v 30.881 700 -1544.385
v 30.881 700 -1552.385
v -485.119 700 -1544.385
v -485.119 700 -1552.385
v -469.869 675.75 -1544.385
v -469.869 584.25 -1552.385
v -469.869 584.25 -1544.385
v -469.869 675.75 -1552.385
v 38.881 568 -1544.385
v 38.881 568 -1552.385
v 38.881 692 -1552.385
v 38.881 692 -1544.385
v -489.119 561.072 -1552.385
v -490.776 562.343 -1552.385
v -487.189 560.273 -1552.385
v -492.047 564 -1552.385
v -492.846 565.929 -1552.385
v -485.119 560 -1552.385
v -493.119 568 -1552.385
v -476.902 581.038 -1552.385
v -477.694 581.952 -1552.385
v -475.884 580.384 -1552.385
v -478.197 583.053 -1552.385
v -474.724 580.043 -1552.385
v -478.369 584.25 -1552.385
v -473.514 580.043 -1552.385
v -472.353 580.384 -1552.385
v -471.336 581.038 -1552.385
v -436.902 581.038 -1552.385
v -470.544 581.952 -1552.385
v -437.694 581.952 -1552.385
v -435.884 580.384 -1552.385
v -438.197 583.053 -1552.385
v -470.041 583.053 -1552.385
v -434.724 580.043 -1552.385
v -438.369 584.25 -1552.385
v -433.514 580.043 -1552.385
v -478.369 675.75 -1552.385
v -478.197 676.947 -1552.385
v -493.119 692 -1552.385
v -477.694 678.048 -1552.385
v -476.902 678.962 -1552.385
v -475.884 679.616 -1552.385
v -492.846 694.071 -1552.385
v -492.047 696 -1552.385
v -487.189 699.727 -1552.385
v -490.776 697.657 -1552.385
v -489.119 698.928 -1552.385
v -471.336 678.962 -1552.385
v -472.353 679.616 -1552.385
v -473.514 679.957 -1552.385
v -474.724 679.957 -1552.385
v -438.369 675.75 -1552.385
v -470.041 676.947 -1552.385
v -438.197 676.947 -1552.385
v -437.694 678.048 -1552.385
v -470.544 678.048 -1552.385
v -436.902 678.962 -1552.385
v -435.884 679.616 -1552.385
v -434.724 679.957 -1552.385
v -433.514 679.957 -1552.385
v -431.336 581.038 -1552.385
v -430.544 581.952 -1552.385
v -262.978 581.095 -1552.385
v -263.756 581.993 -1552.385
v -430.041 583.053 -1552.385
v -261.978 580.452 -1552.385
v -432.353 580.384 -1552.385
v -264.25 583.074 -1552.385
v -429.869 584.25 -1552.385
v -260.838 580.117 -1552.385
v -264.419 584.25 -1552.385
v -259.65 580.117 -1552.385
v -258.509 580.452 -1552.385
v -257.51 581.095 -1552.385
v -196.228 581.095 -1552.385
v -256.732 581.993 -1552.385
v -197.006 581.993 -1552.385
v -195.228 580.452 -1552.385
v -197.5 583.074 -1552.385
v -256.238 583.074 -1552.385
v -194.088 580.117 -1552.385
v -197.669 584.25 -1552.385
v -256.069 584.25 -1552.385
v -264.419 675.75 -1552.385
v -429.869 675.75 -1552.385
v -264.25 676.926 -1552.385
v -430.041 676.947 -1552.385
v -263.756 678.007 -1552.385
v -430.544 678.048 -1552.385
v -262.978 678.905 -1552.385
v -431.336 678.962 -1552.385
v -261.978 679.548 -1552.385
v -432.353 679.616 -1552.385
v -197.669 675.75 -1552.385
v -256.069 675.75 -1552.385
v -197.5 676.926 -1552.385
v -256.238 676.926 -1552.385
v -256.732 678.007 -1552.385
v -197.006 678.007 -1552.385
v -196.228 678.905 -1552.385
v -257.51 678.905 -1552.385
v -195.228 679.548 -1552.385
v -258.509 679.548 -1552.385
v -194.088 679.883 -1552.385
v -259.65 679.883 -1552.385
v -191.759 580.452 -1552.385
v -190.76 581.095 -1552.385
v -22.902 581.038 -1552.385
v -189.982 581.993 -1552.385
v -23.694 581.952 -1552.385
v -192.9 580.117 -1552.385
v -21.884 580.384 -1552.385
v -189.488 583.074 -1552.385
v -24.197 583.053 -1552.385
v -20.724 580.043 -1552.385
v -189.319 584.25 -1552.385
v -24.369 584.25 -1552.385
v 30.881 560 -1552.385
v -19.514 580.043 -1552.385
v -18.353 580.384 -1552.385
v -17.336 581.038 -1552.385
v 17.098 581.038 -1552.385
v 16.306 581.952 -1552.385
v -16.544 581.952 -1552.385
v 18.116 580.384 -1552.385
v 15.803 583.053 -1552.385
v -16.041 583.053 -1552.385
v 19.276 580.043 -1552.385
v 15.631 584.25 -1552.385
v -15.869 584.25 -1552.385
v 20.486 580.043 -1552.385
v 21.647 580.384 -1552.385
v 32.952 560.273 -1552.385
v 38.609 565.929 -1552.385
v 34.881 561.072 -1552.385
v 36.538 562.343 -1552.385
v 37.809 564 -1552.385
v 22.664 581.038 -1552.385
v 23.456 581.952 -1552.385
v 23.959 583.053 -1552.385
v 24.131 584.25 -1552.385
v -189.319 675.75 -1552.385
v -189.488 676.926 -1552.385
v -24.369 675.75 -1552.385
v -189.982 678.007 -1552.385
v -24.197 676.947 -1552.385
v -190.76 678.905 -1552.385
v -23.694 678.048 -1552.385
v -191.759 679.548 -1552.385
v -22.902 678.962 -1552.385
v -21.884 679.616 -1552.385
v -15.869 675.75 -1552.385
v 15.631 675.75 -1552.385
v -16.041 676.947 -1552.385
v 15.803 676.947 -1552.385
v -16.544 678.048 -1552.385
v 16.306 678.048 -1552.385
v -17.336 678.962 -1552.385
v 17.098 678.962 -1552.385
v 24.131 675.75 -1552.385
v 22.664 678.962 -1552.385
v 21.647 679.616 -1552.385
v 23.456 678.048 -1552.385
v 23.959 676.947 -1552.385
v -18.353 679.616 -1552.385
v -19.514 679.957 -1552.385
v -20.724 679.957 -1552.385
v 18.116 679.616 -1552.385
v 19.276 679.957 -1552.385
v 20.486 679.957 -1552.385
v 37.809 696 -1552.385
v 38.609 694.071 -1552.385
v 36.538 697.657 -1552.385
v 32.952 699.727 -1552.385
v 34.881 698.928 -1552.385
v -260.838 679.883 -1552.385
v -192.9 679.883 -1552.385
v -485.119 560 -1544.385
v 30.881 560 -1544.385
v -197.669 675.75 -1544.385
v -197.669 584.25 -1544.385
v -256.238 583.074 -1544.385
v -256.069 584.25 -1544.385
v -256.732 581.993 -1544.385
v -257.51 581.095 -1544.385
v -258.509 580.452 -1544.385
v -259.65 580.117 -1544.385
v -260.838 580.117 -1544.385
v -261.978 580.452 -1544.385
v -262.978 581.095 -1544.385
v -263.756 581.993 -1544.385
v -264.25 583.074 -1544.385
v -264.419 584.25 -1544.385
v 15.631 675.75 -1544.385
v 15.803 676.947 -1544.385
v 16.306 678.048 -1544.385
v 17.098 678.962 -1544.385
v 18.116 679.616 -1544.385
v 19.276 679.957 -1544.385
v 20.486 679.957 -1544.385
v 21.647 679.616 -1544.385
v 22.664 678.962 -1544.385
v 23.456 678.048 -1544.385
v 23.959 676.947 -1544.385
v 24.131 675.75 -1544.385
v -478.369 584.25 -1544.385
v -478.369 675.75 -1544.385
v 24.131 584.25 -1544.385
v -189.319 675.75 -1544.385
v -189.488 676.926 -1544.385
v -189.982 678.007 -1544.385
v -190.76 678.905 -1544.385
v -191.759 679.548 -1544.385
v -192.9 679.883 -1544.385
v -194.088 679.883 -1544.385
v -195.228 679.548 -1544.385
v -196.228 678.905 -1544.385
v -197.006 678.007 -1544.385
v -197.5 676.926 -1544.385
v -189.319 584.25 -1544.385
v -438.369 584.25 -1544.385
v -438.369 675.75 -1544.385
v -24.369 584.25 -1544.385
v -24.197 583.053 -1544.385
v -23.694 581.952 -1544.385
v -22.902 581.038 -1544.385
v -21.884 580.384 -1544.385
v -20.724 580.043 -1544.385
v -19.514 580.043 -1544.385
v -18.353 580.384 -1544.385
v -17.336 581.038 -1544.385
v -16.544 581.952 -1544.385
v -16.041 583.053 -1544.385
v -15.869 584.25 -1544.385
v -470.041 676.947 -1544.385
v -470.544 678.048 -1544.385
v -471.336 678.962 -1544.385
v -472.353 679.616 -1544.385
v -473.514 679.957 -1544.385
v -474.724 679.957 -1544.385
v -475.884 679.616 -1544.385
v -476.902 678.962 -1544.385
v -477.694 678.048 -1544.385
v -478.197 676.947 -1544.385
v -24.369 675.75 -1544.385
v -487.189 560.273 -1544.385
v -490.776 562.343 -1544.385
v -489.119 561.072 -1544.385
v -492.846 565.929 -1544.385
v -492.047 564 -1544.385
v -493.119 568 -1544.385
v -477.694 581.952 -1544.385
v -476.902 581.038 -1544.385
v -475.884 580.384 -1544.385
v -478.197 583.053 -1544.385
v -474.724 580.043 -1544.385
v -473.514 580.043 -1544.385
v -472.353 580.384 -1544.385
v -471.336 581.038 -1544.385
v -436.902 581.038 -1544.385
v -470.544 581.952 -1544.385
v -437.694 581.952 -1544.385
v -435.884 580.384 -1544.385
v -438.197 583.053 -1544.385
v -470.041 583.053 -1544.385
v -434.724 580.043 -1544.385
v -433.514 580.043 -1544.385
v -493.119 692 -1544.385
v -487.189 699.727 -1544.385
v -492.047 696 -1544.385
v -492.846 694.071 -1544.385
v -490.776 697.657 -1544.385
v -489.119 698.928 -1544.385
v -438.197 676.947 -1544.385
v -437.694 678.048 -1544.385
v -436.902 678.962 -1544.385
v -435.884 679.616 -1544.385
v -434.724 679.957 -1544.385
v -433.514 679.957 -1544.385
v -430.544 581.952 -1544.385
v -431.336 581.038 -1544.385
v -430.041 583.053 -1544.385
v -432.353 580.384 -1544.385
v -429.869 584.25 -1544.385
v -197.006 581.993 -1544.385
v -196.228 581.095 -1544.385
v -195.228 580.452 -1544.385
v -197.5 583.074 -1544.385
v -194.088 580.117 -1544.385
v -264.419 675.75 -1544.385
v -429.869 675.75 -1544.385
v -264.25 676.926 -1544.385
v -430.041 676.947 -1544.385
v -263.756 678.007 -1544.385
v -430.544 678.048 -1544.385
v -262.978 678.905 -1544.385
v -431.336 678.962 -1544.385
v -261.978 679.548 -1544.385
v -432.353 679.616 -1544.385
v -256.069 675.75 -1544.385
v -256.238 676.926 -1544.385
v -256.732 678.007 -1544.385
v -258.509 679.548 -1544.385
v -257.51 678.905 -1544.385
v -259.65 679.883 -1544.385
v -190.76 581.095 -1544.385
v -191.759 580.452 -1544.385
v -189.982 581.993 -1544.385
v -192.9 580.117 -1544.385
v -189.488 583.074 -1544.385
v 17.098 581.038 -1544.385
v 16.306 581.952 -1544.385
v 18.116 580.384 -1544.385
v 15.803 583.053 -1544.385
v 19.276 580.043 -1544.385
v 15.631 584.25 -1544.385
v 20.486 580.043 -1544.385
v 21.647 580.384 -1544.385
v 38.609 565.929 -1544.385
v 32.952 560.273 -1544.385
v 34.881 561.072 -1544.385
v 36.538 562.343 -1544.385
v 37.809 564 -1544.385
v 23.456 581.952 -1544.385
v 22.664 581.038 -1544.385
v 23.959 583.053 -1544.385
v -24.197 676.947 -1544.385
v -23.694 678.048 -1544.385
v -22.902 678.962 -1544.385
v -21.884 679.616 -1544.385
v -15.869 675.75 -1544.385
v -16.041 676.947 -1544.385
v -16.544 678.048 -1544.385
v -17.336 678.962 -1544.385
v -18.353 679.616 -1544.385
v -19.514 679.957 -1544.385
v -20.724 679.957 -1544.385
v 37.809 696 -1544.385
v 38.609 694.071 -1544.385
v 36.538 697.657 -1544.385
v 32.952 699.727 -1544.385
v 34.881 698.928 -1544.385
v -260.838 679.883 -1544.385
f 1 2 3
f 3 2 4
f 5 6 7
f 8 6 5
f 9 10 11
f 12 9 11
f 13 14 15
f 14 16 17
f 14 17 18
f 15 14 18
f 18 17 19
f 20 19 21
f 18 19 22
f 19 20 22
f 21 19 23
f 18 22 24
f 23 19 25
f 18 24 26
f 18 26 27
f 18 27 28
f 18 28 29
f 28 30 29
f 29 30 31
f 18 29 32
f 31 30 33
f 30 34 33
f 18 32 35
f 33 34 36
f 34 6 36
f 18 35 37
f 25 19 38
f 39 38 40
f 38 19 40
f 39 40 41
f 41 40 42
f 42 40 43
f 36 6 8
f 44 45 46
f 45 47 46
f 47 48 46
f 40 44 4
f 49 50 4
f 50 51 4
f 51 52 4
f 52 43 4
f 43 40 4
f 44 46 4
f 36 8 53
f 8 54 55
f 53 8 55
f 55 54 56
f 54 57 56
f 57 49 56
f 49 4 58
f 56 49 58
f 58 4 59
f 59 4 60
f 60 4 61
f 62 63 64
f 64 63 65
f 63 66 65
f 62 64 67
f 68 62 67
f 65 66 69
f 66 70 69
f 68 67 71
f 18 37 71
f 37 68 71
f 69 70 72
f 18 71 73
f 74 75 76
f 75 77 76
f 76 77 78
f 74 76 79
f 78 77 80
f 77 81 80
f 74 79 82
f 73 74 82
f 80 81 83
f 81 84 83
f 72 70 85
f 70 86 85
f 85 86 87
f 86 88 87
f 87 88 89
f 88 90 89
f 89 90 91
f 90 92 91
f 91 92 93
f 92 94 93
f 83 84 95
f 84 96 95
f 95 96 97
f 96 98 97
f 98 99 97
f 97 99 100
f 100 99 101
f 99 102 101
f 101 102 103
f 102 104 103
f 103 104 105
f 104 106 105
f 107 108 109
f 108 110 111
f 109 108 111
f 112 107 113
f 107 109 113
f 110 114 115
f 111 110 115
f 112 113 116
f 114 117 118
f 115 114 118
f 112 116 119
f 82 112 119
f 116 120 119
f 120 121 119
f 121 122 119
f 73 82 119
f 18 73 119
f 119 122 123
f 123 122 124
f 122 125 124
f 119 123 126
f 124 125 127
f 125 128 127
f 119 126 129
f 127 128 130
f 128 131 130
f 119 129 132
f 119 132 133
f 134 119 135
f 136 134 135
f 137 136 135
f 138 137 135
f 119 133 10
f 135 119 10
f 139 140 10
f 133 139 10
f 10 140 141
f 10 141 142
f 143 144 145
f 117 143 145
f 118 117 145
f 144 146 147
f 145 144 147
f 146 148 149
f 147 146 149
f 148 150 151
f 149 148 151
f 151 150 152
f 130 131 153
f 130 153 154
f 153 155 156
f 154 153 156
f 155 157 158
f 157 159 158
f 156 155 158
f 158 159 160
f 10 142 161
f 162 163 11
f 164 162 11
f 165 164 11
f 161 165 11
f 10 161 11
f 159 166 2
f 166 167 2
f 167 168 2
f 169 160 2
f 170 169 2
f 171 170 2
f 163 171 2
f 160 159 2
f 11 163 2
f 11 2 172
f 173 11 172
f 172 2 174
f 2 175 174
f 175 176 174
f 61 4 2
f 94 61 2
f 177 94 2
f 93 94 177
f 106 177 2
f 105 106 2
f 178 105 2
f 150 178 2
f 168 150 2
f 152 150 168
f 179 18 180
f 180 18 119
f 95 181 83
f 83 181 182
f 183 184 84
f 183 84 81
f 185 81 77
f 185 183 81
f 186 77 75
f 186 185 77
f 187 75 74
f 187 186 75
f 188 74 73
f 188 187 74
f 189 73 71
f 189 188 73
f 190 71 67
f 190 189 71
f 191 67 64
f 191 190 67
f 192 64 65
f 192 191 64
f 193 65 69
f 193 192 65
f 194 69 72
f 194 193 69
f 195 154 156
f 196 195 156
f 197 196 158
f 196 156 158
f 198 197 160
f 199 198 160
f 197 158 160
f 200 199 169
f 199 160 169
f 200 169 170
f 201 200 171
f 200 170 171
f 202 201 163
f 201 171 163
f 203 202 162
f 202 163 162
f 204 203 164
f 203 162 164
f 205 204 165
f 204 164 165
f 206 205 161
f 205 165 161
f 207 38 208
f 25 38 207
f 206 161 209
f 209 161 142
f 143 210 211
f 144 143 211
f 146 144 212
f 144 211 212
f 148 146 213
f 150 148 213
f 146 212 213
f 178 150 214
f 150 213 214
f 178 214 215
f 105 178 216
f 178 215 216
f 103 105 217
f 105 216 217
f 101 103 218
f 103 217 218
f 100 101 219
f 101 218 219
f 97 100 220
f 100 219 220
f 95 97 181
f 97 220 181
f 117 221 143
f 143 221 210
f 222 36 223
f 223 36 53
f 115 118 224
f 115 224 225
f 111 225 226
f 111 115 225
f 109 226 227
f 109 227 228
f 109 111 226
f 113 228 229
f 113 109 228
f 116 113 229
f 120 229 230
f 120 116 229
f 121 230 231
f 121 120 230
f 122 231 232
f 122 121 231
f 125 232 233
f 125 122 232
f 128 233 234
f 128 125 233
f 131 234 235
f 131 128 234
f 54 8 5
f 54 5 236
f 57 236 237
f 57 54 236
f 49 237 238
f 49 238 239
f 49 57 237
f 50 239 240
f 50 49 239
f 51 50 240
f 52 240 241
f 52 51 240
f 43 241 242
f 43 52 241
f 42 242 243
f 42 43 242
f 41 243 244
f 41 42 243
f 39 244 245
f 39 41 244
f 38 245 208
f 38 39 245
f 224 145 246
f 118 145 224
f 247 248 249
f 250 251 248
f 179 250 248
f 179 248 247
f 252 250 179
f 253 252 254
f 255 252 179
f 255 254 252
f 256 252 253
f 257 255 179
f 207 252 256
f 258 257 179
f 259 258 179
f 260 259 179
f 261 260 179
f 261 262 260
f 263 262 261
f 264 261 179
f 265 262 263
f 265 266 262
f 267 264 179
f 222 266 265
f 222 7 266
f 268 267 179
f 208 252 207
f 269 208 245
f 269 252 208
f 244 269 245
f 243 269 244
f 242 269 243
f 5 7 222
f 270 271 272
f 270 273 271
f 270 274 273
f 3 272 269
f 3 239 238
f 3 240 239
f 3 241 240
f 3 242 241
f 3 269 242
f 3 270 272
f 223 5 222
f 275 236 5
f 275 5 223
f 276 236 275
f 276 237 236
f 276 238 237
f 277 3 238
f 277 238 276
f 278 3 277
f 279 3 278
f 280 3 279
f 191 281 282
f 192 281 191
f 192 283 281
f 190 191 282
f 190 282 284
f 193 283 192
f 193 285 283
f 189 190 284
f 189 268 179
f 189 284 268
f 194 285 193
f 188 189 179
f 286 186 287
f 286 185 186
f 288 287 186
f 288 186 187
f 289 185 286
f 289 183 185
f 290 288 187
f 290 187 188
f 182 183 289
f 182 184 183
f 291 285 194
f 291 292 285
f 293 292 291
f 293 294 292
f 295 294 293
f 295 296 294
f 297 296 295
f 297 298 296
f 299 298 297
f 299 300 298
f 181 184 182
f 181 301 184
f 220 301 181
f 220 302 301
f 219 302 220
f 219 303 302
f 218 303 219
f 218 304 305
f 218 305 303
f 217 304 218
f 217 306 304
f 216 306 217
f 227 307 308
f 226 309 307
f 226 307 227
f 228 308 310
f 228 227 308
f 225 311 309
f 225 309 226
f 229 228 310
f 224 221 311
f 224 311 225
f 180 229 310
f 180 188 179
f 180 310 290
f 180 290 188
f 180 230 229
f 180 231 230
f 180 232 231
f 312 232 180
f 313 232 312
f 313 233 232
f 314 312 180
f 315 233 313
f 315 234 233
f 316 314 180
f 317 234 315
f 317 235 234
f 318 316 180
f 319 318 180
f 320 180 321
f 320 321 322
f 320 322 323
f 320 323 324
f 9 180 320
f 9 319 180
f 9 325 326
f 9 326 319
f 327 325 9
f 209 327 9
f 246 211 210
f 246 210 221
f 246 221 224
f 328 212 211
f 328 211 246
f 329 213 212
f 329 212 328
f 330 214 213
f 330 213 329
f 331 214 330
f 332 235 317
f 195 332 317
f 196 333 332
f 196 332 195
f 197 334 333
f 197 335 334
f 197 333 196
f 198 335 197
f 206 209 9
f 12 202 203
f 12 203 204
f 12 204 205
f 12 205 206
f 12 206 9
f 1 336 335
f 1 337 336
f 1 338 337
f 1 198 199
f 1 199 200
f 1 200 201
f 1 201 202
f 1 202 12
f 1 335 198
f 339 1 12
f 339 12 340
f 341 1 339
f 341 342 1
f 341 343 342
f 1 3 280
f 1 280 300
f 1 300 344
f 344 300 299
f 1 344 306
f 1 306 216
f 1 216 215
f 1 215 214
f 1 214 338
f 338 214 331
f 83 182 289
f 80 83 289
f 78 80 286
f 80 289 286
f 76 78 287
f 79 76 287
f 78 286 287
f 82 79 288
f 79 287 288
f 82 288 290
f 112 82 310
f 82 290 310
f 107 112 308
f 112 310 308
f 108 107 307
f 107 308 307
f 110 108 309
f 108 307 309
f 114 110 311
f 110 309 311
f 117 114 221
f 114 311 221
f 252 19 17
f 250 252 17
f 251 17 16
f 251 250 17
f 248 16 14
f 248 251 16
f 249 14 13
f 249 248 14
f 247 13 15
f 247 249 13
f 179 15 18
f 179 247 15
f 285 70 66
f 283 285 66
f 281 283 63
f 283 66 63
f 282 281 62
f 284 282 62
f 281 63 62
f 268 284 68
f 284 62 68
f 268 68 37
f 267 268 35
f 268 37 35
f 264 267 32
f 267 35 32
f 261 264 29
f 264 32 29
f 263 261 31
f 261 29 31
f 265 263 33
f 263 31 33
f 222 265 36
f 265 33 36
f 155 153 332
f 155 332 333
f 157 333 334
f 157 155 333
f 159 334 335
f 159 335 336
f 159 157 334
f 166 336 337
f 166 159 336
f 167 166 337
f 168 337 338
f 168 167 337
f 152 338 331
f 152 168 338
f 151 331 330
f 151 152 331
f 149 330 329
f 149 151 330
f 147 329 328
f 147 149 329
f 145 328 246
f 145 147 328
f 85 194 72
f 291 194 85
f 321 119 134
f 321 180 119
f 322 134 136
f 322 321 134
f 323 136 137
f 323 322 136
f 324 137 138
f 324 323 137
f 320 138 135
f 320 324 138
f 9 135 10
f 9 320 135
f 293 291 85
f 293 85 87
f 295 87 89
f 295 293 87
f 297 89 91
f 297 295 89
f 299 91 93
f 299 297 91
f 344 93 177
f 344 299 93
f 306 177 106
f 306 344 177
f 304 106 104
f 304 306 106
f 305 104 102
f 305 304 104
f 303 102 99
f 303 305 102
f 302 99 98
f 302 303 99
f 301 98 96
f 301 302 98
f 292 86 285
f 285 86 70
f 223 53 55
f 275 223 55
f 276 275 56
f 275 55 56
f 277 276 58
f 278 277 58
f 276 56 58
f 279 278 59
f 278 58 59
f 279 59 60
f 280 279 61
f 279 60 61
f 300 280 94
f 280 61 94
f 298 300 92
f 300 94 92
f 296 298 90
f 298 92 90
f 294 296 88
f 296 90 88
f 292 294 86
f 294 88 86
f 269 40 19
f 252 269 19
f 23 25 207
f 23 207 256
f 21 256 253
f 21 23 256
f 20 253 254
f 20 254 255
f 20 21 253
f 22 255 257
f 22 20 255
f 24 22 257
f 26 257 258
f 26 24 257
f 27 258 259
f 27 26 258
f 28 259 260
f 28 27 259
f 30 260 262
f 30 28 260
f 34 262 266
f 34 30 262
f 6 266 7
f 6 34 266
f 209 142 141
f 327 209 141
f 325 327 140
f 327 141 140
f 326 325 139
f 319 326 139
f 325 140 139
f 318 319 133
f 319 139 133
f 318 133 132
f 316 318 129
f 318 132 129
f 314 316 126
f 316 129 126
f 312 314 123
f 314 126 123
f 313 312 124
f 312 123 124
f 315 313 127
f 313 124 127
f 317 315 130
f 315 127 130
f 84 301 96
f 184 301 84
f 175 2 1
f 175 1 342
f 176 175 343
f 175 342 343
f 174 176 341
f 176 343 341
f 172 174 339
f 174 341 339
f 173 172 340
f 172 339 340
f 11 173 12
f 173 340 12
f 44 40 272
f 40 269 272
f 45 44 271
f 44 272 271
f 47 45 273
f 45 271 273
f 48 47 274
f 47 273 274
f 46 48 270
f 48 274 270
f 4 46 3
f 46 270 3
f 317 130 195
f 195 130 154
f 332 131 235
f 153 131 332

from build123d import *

# Parameters (mm, degrees)
BOSS_EXTRUDE3_DEPTH = 8
FILLET1_R           = 8
CUT_EXTRUDE3_DEPTH  = 10


with BuildPart() as part:
    # Sketch2 → Boss-Extrude3 (new body)
    with BuildSketch(Plane.XY.offset(-1552.384718604)):
        Polygon((-493.118842126, 700), (-493.118842126, 560), (-480.118842126, 560), (38.881157874, 560), (38.881157874, 700), (-480.118842126, 700), align=None)
        with BuildLine():
            Line((15.631157874, 584.25), (15.631157874, 675.75))
            ThreePointArc((15.631157874, 675.75), (19.881157874, 680), (24.131157874, 675.75))
            Line((24.131157874, 675.75), (24.131157874, 584.25))
            ThreePointArc((24.131157874, 584.25), (19.881157874, 580), (15.631157874, 584.25))
        make_face(mode=Mode.SUBTRACT)
        with BuildLine():
            Line((-15.868842127, 584.25), (-15.868842127, 675.75))
            ThreePointArc((-15.868842127, 675.75), (-20.118842127, 680), (-24.368842127, 675.75))
            Line((-24.368842127, 675.75), (-24.368842127, 584.25))
            ThreePointArc((-24.368842127, 584.25), (-20.118842127, 580), (-15.868842127, 584.25))
        make_face(mode=Mode.SUBTRACT)
        with BuildLine():
            Line((-438.368842126, 584.25), (-438.368842126, 675.75))
            ThreePointArc((-438.368842126, 675.75), (-434.118842126, 680), (-429.868842126, 675.75))
            Line((-429.868842126, 675.75), (-429.868842126, 584.25))
            ThreePointArc((-429.868842126, 584.25), (-434.118842126, 580), (-438.368842126, 584.25))
        make_face(mode=Mode.SUBTRACT)
        with BuildLine():
            Line((-469.868842126, 584.25), (-469.868842126, 675.75))
            ThreePointArc((-469.868842126, 675.75), (-474.118842126, 680), (-478.368842126, 675.75))
            Line((-478.368842126, 675.75), (-478.368842126, 584.25))
            ThreePointArc((-478.368842126, 584.25), (-474.118842126, 580), (-469.868842126, 584.25))
        make_face(mode=Mode.SUBTRACT)
    extrude(amount=BOSS_EXTRUDE3_DEPTH)

    # Fillet1
    fillet1_edges = [part.edges().sort_by_distance(p)[0] for p in [
        (-493.118842126, 560, -1548.384718604),
        (-493.118842126, 700, -1548.384718604),
        (38.881157874, 700, -1548.384718604),
        (38.881157874, 560, -1548.384718604),
    ]]
    fillet(fillet1_edges, radius=FILLET1_R)

    # Sketch7 → Cut-Extrude3 (cut)
    with BuildSketch(Plane.XY.offset(-1544.384718604)):
        with BuildLine():
            Line((-256.068842126, 675.75), (-256.068842126, 584.25))
            ThreePointArc((-256.068842126, 584.25), (-260.243842126, 580.075), (-264.418842126, 584.25))
            Line((-264.418842126, 584.25), (-264.418842126, 675.75))
            ThreePointArc((-264.418842126, 675.75), (-260.243842126, 679.925), (-256.068842126, 675.75))
        make_face()
        with BuildLine():
            Line((-197.668842126, 675.75), (-197.668842126, 584.25))
            ThreePointArc((-197.668842126, 584.25), (-193.493842126, 580.075), (-189.318842126, 584.25))
            Line((-189.318842126, 584.25), (-189.318842126, 675.75))
            ThreePointArc((-189.318842126, 675.75), (-193.493842126, 679.925), (-197.668842126, 675.75))
        make_face()
    extrude(amount=-CUT_EXTRUDE3_DEPTH, mode=Mode.SUBTRACT)


solid = part.part
